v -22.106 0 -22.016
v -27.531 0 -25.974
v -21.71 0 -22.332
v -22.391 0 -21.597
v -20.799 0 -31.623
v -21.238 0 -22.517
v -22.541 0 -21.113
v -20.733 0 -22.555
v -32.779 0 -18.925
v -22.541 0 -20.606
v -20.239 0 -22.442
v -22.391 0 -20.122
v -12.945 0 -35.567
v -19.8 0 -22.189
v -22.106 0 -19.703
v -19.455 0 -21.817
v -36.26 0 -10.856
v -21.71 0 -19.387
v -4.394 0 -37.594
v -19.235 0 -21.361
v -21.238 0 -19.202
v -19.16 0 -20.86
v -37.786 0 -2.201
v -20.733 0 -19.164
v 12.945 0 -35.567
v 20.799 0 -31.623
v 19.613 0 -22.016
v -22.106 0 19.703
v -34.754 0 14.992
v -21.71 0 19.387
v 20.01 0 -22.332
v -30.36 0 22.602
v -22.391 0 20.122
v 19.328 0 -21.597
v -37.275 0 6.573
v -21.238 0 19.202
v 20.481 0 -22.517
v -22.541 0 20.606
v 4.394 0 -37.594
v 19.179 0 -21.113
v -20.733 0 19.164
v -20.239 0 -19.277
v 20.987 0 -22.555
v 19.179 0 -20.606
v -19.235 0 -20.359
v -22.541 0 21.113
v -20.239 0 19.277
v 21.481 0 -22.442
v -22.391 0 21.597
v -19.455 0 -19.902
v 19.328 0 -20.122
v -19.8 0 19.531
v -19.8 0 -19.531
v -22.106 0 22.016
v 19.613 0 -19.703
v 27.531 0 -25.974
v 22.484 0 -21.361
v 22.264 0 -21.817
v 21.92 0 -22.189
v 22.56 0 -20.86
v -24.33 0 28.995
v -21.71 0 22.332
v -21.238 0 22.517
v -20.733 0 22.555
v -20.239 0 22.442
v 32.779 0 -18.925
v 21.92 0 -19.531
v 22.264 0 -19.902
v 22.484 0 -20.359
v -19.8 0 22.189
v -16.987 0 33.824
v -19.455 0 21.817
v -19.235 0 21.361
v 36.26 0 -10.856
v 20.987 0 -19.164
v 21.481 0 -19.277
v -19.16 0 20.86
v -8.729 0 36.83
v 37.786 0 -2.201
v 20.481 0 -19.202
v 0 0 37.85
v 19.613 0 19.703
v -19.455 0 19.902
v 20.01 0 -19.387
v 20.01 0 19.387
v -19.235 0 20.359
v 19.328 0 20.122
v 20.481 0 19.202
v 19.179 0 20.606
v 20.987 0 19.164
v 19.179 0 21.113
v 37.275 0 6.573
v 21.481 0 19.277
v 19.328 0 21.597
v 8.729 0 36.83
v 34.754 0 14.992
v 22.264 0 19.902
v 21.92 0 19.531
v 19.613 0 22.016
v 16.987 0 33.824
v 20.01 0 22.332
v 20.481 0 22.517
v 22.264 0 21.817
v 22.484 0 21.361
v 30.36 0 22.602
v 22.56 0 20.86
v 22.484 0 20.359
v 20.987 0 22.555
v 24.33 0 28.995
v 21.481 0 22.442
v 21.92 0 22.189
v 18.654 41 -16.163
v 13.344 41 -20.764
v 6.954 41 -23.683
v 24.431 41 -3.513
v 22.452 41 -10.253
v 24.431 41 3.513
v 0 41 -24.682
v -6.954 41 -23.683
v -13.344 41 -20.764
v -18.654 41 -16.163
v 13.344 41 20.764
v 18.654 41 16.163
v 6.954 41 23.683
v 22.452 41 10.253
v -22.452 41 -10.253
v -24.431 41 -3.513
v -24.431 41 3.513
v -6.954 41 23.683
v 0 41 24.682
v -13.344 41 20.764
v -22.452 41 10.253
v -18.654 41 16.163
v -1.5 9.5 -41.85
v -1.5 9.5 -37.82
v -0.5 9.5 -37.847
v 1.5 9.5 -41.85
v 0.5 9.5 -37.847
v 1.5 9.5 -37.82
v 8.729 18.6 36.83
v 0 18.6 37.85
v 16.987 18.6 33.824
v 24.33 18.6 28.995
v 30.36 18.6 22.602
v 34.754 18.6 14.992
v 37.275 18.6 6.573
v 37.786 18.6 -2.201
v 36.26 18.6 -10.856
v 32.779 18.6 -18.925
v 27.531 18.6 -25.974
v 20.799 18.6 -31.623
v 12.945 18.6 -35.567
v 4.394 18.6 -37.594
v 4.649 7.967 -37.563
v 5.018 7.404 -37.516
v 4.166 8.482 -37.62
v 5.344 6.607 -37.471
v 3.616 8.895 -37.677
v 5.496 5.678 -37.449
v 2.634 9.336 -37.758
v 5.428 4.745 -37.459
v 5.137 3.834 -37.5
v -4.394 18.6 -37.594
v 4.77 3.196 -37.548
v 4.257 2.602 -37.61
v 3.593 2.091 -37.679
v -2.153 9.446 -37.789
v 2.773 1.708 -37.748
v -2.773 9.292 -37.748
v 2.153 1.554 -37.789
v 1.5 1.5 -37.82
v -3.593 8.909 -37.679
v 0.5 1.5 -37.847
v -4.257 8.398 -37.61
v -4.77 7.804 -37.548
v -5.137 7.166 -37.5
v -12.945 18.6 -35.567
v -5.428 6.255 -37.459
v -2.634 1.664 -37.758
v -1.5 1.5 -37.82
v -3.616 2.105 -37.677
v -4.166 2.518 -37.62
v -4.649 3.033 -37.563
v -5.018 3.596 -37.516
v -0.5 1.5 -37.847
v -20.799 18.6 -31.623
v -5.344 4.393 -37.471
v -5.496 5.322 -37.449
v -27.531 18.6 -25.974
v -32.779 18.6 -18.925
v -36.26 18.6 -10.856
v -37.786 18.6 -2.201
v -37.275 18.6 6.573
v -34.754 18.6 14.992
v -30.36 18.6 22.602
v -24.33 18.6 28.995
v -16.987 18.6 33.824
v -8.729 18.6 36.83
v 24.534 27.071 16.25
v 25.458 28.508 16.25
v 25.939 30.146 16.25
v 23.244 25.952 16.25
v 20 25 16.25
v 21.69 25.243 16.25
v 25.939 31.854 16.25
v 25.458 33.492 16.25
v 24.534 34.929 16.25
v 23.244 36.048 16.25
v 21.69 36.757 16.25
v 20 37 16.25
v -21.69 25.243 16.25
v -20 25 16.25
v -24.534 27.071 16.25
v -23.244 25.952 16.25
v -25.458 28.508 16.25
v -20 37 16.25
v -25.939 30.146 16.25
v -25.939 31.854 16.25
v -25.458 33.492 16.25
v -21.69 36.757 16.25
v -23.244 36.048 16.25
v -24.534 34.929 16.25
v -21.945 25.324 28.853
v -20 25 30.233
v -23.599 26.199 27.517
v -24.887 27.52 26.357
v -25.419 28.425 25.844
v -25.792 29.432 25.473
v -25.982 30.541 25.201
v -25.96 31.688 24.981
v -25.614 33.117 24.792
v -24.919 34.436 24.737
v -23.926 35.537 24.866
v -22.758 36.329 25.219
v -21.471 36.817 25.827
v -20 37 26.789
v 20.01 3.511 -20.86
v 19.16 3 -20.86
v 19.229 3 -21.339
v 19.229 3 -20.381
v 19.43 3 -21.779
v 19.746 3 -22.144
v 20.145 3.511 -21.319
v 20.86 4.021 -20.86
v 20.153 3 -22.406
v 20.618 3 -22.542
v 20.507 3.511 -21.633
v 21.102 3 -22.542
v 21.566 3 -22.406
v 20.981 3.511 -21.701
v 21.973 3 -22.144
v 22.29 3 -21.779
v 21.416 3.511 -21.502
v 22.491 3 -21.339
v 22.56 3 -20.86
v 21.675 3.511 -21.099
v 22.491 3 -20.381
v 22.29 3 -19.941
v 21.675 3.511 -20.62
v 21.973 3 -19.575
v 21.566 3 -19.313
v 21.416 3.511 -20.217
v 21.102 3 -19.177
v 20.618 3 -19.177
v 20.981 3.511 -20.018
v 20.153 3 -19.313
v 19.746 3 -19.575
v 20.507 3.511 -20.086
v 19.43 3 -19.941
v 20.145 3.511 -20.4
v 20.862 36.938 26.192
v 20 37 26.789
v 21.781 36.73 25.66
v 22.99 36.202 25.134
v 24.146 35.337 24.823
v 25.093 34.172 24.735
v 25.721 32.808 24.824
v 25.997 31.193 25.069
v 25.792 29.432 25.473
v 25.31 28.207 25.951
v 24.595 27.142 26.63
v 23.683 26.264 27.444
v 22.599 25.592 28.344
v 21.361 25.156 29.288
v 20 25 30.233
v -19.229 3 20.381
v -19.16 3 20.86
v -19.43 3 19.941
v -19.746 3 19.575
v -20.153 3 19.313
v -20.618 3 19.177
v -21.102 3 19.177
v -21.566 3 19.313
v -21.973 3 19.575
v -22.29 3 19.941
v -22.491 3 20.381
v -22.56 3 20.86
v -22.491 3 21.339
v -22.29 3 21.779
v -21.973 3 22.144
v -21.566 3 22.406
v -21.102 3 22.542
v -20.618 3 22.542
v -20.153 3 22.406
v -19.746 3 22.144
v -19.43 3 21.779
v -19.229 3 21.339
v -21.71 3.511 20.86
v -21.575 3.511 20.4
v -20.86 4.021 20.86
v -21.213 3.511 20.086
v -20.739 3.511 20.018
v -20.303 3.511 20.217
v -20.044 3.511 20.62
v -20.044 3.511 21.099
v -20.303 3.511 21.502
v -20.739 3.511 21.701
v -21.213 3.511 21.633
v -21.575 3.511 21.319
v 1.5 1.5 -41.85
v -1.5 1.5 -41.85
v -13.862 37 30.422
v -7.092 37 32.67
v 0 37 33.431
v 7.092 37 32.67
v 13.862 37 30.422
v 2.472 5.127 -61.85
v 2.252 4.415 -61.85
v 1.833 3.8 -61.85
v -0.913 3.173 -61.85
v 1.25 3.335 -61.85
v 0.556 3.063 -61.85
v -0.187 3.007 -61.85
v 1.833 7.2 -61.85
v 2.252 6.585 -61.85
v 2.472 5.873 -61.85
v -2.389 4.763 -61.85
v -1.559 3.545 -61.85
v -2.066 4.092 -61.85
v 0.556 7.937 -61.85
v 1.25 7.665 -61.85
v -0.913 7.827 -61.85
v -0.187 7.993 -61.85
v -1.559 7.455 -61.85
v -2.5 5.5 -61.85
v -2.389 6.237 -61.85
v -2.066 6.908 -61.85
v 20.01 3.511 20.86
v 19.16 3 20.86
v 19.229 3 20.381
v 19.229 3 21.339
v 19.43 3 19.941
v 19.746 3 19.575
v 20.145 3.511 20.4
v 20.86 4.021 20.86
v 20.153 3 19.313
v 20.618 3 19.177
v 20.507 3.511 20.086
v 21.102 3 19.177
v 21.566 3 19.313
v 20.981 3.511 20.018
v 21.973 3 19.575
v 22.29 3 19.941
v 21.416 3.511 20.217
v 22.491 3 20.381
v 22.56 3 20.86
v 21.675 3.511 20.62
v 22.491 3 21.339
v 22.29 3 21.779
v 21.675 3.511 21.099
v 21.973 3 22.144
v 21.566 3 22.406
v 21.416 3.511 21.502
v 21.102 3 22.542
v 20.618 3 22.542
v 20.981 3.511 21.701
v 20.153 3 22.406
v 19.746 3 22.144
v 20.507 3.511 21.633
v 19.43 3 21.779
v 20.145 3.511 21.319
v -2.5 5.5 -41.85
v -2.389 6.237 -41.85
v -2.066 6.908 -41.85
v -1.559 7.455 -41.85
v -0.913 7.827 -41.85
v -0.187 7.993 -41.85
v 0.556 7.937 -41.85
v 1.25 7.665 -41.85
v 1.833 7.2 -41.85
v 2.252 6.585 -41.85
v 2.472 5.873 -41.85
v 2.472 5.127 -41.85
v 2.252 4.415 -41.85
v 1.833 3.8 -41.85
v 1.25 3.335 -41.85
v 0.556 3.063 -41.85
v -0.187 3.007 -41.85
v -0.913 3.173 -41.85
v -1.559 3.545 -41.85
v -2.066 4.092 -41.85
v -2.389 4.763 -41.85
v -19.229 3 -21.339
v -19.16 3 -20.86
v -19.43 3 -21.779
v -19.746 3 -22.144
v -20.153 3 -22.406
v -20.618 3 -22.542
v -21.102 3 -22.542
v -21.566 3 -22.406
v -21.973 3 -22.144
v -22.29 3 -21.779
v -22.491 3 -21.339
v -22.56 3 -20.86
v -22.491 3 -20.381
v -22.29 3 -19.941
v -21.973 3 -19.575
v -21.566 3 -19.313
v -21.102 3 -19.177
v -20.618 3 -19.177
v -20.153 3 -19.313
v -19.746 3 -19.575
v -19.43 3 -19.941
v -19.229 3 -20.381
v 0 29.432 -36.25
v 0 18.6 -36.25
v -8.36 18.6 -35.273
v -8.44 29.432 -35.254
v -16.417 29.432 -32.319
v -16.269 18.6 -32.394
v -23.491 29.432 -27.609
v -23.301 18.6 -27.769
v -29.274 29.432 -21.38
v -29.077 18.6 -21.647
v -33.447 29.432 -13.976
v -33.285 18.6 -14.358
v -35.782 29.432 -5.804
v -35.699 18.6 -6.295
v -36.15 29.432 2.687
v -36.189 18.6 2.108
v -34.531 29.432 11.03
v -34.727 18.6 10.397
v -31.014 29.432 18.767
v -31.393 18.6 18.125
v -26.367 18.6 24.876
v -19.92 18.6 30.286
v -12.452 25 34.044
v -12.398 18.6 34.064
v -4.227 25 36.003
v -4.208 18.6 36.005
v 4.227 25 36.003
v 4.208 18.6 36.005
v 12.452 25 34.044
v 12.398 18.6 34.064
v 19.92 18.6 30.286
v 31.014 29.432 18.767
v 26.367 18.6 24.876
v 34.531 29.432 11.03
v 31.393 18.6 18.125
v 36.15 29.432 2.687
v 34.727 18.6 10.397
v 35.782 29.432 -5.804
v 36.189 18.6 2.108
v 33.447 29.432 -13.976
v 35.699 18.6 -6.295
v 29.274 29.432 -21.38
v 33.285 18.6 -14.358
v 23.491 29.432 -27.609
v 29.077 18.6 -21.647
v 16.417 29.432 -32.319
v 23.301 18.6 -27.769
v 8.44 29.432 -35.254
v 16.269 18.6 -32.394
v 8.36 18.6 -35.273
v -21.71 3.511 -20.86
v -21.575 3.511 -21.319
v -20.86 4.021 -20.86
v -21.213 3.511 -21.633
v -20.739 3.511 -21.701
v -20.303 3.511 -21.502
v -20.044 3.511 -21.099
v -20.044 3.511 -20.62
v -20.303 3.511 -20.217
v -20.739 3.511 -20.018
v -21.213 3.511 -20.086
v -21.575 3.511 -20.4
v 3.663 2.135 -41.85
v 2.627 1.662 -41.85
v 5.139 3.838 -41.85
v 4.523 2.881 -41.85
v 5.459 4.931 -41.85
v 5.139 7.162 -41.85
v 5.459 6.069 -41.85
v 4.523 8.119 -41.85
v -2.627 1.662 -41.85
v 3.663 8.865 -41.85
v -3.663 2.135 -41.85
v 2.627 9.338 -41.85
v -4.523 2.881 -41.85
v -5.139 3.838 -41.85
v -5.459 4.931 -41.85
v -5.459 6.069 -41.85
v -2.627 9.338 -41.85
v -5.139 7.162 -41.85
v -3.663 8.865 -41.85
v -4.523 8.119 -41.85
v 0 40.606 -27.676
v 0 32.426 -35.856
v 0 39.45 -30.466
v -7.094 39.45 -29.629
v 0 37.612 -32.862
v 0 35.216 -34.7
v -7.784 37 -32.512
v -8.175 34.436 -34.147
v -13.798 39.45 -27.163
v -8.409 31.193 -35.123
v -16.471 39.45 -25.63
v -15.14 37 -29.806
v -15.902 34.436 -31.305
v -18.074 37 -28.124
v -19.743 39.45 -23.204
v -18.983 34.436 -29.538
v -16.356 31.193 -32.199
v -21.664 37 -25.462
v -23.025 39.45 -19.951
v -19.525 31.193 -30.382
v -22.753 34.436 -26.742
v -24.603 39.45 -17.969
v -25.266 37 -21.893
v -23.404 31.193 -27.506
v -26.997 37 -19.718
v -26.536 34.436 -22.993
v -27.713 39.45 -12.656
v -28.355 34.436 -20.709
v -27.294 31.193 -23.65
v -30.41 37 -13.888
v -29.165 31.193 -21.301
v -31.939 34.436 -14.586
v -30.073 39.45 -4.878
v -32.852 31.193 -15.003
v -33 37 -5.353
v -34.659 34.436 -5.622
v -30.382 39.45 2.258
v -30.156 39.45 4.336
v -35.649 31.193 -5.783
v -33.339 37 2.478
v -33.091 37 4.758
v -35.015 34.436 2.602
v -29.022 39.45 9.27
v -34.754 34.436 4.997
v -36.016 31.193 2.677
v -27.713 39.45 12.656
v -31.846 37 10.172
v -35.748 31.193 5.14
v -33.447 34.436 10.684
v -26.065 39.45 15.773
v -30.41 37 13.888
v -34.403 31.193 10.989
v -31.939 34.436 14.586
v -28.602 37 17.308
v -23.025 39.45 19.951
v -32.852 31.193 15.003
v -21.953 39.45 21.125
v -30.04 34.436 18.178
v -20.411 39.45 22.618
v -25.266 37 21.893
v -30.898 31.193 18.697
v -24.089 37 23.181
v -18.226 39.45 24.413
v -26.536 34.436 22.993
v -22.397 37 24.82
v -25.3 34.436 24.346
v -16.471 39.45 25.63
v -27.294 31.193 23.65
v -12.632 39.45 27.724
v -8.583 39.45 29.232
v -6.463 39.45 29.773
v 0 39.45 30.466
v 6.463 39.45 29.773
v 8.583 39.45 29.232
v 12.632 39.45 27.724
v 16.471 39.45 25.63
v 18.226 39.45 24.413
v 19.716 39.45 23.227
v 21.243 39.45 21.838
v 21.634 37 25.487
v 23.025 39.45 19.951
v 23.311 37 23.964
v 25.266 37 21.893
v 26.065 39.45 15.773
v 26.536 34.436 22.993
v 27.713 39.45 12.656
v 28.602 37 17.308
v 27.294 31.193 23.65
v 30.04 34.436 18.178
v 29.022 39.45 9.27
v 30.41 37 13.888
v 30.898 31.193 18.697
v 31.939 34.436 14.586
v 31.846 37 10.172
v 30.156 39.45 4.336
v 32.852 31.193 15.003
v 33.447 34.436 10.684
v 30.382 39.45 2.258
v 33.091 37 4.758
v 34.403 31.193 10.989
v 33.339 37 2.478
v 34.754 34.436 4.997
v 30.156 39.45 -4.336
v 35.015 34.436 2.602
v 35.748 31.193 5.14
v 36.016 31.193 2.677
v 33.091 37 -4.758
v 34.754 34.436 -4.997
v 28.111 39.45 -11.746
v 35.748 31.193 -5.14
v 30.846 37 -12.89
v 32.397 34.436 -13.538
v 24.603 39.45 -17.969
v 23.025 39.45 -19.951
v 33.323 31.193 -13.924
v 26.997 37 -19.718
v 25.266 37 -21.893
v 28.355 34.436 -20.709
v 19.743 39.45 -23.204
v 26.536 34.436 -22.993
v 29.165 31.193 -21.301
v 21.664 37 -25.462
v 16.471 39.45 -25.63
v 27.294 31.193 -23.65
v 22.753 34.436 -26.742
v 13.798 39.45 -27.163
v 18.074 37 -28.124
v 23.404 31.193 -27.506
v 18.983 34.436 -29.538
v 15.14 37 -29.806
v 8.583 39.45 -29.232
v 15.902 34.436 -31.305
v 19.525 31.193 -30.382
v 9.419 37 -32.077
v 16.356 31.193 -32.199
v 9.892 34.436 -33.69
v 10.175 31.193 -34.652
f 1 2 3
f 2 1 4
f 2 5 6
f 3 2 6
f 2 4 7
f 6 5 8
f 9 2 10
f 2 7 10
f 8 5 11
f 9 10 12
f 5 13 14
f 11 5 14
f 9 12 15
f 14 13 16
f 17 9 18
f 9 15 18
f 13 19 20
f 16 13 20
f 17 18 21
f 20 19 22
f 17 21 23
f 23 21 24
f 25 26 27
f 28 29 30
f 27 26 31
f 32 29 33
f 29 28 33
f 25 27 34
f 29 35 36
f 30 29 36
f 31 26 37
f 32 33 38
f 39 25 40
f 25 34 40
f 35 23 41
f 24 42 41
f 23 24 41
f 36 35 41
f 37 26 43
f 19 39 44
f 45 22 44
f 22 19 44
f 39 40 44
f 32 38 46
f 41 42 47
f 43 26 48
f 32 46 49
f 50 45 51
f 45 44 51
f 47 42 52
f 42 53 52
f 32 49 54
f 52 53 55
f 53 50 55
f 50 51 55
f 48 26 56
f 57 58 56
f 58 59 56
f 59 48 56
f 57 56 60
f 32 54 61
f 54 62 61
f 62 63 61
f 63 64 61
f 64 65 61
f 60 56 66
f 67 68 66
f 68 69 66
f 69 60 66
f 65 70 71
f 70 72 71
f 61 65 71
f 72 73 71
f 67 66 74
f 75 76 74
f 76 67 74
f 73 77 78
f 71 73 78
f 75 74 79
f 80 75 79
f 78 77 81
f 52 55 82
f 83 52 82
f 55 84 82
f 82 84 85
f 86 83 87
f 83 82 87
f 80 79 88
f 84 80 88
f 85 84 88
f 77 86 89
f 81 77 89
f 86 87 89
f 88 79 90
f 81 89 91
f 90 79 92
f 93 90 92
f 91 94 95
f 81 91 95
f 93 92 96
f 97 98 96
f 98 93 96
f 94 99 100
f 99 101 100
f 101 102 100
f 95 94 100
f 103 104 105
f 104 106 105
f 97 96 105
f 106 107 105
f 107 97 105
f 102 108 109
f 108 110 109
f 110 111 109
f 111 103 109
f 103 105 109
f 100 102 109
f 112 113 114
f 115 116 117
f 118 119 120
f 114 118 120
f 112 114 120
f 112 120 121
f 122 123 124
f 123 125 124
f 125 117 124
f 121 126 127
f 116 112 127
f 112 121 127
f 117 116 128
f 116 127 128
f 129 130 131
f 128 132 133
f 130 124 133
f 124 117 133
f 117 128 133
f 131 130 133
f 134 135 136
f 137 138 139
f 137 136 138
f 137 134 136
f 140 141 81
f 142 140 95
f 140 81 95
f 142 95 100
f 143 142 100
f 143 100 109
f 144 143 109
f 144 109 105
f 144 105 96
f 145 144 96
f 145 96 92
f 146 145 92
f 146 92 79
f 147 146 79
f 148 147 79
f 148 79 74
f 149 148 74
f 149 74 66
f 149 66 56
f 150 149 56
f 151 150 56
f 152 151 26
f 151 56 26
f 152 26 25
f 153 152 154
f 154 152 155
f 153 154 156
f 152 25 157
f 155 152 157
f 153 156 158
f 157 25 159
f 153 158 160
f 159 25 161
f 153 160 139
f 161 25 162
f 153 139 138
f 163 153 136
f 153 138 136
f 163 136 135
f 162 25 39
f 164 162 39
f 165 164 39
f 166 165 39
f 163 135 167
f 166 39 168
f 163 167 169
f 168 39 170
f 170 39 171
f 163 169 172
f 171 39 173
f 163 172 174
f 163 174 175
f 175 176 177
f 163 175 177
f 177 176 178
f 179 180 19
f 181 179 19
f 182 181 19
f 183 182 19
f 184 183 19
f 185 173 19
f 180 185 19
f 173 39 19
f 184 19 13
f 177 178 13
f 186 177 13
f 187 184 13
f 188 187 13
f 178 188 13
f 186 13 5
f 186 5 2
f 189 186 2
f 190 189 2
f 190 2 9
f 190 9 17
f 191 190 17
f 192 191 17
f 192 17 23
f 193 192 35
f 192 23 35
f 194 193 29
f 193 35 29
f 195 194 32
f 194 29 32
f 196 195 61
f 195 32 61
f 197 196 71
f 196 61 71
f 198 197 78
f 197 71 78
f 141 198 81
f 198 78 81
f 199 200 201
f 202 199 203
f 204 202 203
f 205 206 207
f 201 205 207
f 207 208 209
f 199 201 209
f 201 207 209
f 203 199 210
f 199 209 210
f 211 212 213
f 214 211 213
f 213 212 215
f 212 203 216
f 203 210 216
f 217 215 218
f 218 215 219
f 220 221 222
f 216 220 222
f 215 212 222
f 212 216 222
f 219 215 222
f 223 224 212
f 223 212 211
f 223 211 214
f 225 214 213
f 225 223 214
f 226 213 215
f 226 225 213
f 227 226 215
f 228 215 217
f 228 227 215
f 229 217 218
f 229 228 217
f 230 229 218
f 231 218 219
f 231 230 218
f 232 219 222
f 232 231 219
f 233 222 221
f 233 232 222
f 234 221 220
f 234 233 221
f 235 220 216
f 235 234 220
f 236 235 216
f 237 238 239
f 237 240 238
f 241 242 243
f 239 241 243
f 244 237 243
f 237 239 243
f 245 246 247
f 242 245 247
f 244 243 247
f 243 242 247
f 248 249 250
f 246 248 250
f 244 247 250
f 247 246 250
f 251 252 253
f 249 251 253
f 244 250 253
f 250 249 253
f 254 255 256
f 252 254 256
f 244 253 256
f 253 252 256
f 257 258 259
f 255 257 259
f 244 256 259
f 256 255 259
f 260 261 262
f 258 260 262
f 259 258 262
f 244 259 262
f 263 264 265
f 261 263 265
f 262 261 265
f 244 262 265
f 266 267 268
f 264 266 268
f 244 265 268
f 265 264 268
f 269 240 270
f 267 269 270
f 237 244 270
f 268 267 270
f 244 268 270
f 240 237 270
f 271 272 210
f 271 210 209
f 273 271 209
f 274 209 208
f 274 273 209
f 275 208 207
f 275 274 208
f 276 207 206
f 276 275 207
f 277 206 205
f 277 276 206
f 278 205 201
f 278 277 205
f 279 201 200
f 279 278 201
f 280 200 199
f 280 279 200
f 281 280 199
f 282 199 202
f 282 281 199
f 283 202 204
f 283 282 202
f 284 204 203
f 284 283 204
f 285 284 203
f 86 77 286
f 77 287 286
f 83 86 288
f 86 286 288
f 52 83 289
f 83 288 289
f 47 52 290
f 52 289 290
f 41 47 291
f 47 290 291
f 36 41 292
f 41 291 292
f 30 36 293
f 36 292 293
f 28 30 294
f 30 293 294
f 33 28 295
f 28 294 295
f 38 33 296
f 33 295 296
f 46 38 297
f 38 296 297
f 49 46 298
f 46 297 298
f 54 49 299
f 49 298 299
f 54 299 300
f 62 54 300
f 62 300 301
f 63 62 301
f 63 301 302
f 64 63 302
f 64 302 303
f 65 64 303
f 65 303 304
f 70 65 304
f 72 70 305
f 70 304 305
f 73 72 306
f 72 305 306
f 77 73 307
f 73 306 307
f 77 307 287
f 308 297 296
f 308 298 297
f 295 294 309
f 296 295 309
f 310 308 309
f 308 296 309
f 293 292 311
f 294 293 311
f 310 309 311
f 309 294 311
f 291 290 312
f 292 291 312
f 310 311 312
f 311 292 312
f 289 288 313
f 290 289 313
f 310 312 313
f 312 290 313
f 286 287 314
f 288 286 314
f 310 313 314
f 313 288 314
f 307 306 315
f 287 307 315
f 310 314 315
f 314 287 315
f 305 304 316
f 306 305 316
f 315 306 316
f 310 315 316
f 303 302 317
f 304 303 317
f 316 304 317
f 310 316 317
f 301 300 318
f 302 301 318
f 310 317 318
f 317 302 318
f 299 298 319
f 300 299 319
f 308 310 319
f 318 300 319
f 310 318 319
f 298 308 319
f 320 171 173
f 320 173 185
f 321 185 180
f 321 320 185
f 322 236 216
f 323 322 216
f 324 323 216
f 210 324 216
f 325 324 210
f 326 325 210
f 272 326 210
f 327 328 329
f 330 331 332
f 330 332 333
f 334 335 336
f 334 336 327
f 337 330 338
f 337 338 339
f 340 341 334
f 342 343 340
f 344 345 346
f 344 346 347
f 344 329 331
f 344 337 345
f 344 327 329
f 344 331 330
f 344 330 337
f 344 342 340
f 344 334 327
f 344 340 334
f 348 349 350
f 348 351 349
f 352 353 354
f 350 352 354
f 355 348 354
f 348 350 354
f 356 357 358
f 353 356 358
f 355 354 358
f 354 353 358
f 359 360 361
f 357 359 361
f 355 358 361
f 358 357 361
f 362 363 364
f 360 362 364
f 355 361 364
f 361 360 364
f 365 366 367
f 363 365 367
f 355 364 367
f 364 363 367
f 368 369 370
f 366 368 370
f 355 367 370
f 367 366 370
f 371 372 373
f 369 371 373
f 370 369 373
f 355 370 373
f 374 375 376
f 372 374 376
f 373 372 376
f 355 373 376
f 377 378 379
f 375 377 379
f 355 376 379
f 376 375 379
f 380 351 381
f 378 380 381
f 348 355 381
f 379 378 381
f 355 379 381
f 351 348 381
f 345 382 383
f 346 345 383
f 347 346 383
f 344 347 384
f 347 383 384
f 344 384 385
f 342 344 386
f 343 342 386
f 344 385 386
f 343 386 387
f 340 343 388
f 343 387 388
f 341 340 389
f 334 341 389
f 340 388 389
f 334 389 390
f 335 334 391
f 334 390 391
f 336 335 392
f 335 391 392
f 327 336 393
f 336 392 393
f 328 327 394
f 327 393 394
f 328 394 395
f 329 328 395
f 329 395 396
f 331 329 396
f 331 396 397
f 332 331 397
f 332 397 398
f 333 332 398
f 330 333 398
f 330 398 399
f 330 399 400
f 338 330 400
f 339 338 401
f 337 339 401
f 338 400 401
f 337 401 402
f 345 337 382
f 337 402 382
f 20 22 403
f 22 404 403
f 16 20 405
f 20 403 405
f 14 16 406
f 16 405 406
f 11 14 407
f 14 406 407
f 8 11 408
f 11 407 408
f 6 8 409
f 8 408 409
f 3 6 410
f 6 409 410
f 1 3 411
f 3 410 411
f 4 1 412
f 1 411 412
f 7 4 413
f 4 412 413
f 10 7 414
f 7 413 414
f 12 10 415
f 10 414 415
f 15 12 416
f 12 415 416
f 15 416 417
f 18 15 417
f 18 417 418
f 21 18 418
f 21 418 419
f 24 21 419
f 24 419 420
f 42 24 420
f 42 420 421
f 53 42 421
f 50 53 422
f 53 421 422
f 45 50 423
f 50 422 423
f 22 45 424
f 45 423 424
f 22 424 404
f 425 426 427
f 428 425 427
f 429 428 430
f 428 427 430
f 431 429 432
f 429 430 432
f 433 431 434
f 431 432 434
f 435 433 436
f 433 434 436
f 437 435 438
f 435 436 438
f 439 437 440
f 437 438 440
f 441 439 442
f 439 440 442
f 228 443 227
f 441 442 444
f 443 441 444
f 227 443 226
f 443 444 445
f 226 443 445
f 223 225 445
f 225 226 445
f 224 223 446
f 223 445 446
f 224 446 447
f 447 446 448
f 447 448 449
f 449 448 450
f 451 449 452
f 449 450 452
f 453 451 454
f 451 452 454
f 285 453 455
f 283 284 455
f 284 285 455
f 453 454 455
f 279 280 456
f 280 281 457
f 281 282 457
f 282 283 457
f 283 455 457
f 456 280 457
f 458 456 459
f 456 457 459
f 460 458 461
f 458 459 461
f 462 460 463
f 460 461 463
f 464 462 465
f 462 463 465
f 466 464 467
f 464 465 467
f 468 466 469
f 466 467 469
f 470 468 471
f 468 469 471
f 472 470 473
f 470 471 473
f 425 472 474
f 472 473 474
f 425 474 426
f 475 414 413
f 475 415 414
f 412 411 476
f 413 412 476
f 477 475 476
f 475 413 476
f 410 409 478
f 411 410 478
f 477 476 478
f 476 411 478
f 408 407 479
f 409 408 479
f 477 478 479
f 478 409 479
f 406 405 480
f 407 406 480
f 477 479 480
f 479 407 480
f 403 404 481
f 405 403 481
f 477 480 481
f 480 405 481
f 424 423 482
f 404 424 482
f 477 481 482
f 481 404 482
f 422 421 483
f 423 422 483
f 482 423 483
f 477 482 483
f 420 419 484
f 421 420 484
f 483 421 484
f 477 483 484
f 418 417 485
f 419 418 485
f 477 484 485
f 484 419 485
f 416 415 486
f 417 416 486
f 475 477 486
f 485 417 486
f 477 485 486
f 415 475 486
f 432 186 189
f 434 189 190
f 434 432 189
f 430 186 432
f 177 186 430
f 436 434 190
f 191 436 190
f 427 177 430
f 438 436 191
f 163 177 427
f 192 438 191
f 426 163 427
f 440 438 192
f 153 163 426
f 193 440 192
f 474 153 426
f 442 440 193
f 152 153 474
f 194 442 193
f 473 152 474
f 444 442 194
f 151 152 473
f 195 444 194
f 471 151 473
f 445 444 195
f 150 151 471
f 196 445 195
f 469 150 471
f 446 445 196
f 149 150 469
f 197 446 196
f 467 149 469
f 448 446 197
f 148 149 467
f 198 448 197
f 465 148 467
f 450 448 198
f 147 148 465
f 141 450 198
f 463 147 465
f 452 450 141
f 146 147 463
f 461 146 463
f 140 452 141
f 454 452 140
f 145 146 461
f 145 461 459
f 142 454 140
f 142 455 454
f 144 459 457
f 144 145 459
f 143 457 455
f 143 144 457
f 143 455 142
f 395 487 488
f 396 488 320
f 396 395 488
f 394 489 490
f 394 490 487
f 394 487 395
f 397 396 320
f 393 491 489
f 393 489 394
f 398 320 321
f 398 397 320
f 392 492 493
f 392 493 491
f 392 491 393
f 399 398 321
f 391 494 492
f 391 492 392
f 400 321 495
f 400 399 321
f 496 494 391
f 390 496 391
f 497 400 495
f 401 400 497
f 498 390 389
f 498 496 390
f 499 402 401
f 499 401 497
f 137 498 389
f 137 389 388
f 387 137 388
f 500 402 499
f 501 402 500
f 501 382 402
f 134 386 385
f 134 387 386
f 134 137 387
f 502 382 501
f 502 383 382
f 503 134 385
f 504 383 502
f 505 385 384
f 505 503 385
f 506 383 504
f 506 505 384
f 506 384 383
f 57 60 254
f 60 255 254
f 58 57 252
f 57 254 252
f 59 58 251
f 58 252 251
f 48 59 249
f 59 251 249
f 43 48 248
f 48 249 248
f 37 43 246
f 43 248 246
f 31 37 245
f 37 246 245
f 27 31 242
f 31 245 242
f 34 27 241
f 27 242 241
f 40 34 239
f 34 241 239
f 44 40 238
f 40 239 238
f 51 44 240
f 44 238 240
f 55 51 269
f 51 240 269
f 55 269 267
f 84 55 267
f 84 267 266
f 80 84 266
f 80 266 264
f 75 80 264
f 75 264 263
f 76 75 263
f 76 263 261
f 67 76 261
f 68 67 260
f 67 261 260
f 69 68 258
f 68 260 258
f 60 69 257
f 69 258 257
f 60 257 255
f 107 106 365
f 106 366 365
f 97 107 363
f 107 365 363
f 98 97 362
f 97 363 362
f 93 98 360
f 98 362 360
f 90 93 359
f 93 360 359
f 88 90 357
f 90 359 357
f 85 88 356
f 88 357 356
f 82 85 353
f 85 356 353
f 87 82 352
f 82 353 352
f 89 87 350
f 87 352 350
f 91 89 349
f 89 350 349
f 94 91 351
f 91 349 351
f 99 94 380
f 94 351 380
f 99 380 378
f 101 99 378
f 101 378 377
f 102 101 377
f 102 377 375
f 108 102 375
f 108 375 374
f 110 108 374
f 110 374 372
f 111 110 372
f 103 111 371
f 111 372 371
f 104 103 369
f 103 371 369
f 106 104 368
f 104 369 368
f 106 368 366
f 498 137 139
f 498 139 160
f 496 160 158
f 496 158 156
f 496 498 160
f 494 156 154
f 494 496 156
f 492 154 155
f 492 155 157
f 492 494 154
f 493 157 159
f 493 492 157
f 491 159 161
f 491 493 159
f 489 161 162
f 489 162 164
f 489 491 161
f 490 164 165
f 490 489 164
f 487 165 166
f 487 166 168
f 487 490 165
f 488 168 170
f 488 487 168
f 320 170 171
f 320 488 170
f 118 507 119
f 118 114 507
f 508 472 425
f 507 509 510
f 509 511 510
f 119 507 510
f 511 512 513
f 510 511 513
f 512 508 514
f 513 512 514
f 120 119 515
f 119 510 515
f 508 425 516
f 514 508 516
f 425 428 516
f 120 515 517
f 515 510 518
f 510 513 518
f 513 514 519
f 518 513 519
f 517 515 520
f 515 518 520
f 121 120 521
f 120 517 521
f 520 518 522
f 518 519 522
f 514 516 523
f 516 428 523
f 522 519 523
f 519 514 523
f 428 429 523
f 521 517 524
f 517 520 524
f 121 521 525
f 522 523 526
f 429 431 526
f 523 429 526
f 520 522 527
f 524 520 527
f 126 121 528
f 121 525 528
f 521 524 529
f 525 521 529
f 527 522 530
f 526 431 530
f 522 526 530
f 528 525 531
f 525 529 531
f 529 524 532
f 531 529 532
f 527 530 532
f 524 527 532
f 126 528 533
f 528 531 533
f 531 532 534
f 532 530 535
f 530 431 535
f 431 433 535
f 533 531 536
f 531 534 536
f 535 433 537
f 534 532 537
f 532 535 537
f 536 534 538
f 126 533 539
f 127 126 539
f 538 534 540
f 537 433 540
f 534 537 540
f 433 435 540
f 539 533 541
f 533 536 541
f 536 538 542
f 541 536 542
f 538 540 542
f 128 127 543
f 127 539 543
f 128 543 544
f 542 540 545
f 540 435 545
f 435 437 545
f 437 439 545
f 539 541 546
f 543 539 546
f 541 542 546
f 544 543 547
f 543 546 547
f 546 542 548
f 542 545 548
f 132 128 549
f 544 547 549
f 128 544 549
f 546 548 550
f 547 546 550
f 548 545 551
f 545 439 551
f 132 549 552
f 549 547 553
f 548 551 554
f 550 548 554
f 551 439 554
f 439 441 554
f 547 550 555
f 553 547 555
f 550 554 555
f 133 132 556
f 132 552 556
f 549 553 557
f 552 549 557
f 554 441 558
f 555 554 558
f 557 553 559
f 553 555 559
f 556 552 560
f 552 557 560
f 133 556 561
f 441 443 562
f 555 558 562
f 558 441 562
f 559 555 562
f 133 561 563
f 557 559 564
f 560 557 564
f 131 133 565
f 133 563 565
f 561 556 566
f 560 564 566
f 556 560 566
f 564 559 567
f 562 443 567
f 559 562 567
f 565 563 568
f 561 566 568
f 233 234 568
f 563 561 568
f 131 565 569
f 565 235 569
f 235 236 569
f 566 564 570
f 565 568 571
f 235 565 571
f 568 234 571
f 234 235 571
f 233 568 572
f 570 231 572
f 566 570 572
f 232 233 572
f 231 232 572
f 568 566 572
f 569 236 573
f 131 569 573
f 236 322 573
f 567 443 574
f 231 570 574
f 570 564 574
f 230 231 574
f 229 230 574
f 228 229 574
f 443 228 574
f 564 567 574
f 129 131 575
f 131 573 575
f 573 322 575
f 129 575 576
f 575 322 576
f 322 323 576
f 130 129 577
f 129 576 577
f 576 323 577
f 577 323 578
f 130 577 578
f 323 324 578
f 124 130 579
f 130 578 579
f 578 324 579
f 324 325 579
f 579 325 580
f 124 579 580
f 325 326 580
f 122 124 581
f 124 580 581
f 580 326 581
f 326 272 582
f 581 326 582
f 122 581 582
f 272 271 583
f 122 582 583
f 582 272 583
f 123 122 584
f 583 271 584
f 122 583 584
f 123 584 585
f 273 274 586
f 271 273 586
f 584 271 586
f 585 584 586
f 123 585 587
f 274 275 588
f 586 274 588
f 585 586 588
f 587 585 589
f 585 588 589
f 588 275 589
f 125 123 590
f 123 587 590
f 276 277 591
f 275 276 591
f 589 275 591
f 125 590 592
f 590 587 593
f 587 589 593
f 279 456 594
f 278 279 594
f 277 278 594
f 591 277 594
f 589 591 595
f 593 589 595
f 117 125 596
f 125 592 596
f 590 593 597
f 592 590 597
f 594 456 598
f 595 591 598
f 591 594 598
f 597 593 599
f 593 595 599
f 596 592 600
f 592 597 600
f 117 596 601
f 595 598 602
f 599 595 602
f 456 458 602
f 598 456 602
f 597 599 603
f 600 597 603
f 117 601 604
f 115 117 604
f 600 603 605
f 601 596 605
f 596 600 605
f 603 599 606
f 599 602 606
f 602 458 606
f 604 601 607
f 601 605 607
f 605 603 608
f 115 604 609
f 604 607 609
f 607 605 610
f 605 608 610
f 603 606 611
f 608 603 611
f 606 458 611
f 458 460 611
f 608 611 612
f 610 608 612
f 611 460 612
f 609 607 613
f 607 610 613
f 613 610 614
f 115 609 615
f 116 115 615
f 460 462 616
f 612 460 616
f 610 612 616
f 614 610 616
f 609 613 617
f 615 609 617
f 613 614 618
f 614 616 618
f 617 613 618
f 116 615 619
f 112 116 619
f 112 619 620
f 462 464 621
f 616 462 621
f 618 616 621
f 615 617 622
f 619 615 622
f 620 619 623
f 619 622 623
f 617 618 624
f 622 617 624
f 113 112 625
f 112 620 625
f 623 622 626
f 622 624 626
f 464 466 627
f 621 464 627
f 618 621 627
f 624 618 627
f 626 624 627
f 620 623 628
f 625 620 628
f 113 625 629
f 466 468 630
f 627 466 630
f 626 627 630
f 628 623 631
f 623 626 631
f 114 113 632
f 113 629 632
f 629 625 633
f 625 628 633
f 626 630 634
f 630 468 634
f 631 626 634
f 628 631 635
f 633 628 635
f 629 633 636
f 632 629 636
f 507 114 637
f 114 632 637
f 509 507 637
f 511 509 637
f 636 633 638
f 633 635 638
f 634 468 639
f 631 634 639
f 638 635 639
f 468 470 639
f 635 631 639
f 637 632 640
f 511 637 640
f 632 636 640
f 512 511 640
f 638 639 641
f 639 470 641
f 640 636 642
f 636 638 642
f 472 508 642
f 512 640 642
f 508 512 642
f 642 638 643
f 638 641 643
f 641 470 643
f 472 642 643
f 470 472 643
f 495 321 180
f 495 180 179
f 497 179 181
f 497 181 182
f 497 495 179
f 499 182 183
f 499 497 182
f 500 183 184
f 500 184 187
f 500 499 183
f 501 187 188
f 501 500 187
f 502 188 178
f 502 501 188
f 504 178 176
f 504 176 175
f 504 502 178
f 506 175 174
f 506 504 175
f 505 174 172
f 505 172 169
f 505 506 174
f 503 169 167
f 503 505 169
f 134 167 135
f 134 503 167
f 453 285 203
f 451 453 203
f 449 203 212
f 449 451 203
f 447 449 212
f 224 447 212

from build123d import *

# Parameters (mm, degrees)
ESQUISSE1_R                         = 37.85
BOSS_EXTRU_1_DEPTH                  = 18.6
ENL_V_MAT_EXTRU_1_DEPTH             = 20
D_GAGEMENT_M31_D                    = 3.4
D_GAGEMENT_M31_DEPTH                = 3
D_GAGEMENT_M31_TIP                  = 1.021463052
BOSS_EXTRU_2_DEPTH                  = 4
BOSS_EXTRU_2_DIRECTION_2_REACH      = 96.043
BOSS_EXTRU_2_DIRECTION_2_END_RADIUS = 37.85
ESQUISSE9_R                         = 2.5
BOSS_EXTRU_3_DEPTH                  = 20


with BuildPart() as part:
    # Esquisse1 → Boss.-Extru.1 (new body)
    with BuildSketch(Plane(origin=(0, 0, 0), x_dir=(1, 0, 0), z_dir=(0, 1, 0))):
        with Locations(Location((0, 0, 0), (0, 0, 270))):
            Circle(ESQUISSE1_R)
    extrude(amount=BOSS_EXTRU_1_DEPTH)

    # Esquisse2 → Révolution1 (revolve)
    with BuildSketch(Plane.XY, mode=Mode.PRIVATE) as r_volution1_sk:
        with BuildLine():
            Line((0, 18.6), (0, 41))
            Line((0, 41), (-24.682338214, 41))
            ThreePointArc((-24.682338214, 41), (-32.861910305, 37.611910305), (-36.25, 29.432338214))
            Line((-36.25, 29.432338214), (-36.25, 18.6))
            Line((-36.25, 18.6), (0, 18.6))
        make_face()
    revolve(r_volution1_sk.sketch.rotate(Axis((0, 18.6, 0), (0, 1, 0)), 270), axis=Axis((0, 18.6, 0), (0, 1, 0)))

    # Esquisse3 → Enlèv. mat.-Extru.1 (cut)
    with BuildSketch(Plane.XY.offset(36.25)):
        with BuildLine():
            Line((-20, 37), (20, 37))
            ThreePointArc((20, 37), (26, 31), (20, 25))
            Line((20, 25), (-20, 25))
            ThreePointArc((-20, 25), (-26, 31), (-20, 37))
        make_face()
    extrude(amount=-ENL_V_MAT_EXTRU_1_DEPTH, mode=Mode.SUBTRACT)

    # Dégagement M31
    with Locations(Plane(origin=(0, 0, 0), x_dir=(-1, 0, 0), z_dir=(0, -1, 0))):
        with Locations((20.859650045, -20.859650045), (-20.859650045, -20.859650045), (-20.859650045, 20.859650045), (20.859650045, 20.859650045)):
            Hole(D_GAGEMENT_M31_D / 2, depth=D_GAGEMENT_M31_DEPTH)
            with Locations((0, 0, -(D_GAGEMENT_M31_DEPTH + D_GAGEMENT_M31_TIP / 2))):  # 118° drill point
                Cone(0, D_GAGEMENT_M31_D / 2, D_GAGEMENT_M31_TIP, mode=Mode.SUBTRACT)

    # Esquisse8 → Boss.-Extru.2 (add)
    with BuildSketch(Plane.XY.offset(-37.85)):
        with BuildLine():
            Line((-1.5, 9.5), (1.5, 9.5))
            ThreePointArc((1.5, 9.5), (5.5, 5.5), (1.5, 1.5))
            Line((1.5, 1.5), (-1.5, 1.5))
            ThreePointArc((-1.5, 1.5), (-5.5, 5.5), (-1.5, 9.5))
        make_face()
    extrude(amount=-BOSS_EXTRU_2_DEPTH)

    # Boss.-Extru.2 direction 2: up to this cylinder (the profile starts outside it)
    boss_extru_2_direction_2_end = Plane(origin=(0, 5.5, 0), z_dir=(0, -1, 0)) * Cylinder(BOSS_EXTRU_2_DIRECTION_2_END_RADIUS, 268.786, mode=Mode.PRIVATE)
    # Esquisse8 → Boss.-Extru.2 direction 2 (add, up to the surface)
    with BuildSketch(Plane.XY.offset(-37.85), mode=Mode.PRIVATE) as boss_extru_2_direction_2_sk1:
        with BuildLine():
            Line((-1.5, 9.5), (1.5, 9.5))
            ThreePointArc((1.5, 9.5), (5.5, 5.5), (1.5, 1.5))
            Line((1.5, 1.5), (-1.5, 1.5))
            ThreePointArc((-1.5, 1.5), (-5.5, 5.5), (-1.5, 9.5))
        make_face()
    boss_extru_2_direction_2_tool1 = extrude(boss_extru_2_direction_2_sk1.sketch, amount=BOSS_EXTRU_2_DIRECTION_2_REACH, mode=Mode.PRIVATE) - boss_extru_2_direction_2_end
    add(boss_extru_2_direction_2_tool1.solids().sort_by_distance((0, 5.5, -37.85))[0])
    add(boss_extru_2_direction_2_tool1.solids().sort_by_distance((0, 5.5, -37.85))[1])

    # Esquisse9 → Boss.-Extru.3 (add)
    with BuildSketch(Plane(origin=(0, 0, -41.85), x_dir=(-1, 0, 0), z_dir=(0, 0, -1))):
        with Locations((0, 5.5)):
            Circle(ESQUISSE9_R)
    extrude(amount=BOSS_EXTRU_3_DEPTH)


solid = part.part
